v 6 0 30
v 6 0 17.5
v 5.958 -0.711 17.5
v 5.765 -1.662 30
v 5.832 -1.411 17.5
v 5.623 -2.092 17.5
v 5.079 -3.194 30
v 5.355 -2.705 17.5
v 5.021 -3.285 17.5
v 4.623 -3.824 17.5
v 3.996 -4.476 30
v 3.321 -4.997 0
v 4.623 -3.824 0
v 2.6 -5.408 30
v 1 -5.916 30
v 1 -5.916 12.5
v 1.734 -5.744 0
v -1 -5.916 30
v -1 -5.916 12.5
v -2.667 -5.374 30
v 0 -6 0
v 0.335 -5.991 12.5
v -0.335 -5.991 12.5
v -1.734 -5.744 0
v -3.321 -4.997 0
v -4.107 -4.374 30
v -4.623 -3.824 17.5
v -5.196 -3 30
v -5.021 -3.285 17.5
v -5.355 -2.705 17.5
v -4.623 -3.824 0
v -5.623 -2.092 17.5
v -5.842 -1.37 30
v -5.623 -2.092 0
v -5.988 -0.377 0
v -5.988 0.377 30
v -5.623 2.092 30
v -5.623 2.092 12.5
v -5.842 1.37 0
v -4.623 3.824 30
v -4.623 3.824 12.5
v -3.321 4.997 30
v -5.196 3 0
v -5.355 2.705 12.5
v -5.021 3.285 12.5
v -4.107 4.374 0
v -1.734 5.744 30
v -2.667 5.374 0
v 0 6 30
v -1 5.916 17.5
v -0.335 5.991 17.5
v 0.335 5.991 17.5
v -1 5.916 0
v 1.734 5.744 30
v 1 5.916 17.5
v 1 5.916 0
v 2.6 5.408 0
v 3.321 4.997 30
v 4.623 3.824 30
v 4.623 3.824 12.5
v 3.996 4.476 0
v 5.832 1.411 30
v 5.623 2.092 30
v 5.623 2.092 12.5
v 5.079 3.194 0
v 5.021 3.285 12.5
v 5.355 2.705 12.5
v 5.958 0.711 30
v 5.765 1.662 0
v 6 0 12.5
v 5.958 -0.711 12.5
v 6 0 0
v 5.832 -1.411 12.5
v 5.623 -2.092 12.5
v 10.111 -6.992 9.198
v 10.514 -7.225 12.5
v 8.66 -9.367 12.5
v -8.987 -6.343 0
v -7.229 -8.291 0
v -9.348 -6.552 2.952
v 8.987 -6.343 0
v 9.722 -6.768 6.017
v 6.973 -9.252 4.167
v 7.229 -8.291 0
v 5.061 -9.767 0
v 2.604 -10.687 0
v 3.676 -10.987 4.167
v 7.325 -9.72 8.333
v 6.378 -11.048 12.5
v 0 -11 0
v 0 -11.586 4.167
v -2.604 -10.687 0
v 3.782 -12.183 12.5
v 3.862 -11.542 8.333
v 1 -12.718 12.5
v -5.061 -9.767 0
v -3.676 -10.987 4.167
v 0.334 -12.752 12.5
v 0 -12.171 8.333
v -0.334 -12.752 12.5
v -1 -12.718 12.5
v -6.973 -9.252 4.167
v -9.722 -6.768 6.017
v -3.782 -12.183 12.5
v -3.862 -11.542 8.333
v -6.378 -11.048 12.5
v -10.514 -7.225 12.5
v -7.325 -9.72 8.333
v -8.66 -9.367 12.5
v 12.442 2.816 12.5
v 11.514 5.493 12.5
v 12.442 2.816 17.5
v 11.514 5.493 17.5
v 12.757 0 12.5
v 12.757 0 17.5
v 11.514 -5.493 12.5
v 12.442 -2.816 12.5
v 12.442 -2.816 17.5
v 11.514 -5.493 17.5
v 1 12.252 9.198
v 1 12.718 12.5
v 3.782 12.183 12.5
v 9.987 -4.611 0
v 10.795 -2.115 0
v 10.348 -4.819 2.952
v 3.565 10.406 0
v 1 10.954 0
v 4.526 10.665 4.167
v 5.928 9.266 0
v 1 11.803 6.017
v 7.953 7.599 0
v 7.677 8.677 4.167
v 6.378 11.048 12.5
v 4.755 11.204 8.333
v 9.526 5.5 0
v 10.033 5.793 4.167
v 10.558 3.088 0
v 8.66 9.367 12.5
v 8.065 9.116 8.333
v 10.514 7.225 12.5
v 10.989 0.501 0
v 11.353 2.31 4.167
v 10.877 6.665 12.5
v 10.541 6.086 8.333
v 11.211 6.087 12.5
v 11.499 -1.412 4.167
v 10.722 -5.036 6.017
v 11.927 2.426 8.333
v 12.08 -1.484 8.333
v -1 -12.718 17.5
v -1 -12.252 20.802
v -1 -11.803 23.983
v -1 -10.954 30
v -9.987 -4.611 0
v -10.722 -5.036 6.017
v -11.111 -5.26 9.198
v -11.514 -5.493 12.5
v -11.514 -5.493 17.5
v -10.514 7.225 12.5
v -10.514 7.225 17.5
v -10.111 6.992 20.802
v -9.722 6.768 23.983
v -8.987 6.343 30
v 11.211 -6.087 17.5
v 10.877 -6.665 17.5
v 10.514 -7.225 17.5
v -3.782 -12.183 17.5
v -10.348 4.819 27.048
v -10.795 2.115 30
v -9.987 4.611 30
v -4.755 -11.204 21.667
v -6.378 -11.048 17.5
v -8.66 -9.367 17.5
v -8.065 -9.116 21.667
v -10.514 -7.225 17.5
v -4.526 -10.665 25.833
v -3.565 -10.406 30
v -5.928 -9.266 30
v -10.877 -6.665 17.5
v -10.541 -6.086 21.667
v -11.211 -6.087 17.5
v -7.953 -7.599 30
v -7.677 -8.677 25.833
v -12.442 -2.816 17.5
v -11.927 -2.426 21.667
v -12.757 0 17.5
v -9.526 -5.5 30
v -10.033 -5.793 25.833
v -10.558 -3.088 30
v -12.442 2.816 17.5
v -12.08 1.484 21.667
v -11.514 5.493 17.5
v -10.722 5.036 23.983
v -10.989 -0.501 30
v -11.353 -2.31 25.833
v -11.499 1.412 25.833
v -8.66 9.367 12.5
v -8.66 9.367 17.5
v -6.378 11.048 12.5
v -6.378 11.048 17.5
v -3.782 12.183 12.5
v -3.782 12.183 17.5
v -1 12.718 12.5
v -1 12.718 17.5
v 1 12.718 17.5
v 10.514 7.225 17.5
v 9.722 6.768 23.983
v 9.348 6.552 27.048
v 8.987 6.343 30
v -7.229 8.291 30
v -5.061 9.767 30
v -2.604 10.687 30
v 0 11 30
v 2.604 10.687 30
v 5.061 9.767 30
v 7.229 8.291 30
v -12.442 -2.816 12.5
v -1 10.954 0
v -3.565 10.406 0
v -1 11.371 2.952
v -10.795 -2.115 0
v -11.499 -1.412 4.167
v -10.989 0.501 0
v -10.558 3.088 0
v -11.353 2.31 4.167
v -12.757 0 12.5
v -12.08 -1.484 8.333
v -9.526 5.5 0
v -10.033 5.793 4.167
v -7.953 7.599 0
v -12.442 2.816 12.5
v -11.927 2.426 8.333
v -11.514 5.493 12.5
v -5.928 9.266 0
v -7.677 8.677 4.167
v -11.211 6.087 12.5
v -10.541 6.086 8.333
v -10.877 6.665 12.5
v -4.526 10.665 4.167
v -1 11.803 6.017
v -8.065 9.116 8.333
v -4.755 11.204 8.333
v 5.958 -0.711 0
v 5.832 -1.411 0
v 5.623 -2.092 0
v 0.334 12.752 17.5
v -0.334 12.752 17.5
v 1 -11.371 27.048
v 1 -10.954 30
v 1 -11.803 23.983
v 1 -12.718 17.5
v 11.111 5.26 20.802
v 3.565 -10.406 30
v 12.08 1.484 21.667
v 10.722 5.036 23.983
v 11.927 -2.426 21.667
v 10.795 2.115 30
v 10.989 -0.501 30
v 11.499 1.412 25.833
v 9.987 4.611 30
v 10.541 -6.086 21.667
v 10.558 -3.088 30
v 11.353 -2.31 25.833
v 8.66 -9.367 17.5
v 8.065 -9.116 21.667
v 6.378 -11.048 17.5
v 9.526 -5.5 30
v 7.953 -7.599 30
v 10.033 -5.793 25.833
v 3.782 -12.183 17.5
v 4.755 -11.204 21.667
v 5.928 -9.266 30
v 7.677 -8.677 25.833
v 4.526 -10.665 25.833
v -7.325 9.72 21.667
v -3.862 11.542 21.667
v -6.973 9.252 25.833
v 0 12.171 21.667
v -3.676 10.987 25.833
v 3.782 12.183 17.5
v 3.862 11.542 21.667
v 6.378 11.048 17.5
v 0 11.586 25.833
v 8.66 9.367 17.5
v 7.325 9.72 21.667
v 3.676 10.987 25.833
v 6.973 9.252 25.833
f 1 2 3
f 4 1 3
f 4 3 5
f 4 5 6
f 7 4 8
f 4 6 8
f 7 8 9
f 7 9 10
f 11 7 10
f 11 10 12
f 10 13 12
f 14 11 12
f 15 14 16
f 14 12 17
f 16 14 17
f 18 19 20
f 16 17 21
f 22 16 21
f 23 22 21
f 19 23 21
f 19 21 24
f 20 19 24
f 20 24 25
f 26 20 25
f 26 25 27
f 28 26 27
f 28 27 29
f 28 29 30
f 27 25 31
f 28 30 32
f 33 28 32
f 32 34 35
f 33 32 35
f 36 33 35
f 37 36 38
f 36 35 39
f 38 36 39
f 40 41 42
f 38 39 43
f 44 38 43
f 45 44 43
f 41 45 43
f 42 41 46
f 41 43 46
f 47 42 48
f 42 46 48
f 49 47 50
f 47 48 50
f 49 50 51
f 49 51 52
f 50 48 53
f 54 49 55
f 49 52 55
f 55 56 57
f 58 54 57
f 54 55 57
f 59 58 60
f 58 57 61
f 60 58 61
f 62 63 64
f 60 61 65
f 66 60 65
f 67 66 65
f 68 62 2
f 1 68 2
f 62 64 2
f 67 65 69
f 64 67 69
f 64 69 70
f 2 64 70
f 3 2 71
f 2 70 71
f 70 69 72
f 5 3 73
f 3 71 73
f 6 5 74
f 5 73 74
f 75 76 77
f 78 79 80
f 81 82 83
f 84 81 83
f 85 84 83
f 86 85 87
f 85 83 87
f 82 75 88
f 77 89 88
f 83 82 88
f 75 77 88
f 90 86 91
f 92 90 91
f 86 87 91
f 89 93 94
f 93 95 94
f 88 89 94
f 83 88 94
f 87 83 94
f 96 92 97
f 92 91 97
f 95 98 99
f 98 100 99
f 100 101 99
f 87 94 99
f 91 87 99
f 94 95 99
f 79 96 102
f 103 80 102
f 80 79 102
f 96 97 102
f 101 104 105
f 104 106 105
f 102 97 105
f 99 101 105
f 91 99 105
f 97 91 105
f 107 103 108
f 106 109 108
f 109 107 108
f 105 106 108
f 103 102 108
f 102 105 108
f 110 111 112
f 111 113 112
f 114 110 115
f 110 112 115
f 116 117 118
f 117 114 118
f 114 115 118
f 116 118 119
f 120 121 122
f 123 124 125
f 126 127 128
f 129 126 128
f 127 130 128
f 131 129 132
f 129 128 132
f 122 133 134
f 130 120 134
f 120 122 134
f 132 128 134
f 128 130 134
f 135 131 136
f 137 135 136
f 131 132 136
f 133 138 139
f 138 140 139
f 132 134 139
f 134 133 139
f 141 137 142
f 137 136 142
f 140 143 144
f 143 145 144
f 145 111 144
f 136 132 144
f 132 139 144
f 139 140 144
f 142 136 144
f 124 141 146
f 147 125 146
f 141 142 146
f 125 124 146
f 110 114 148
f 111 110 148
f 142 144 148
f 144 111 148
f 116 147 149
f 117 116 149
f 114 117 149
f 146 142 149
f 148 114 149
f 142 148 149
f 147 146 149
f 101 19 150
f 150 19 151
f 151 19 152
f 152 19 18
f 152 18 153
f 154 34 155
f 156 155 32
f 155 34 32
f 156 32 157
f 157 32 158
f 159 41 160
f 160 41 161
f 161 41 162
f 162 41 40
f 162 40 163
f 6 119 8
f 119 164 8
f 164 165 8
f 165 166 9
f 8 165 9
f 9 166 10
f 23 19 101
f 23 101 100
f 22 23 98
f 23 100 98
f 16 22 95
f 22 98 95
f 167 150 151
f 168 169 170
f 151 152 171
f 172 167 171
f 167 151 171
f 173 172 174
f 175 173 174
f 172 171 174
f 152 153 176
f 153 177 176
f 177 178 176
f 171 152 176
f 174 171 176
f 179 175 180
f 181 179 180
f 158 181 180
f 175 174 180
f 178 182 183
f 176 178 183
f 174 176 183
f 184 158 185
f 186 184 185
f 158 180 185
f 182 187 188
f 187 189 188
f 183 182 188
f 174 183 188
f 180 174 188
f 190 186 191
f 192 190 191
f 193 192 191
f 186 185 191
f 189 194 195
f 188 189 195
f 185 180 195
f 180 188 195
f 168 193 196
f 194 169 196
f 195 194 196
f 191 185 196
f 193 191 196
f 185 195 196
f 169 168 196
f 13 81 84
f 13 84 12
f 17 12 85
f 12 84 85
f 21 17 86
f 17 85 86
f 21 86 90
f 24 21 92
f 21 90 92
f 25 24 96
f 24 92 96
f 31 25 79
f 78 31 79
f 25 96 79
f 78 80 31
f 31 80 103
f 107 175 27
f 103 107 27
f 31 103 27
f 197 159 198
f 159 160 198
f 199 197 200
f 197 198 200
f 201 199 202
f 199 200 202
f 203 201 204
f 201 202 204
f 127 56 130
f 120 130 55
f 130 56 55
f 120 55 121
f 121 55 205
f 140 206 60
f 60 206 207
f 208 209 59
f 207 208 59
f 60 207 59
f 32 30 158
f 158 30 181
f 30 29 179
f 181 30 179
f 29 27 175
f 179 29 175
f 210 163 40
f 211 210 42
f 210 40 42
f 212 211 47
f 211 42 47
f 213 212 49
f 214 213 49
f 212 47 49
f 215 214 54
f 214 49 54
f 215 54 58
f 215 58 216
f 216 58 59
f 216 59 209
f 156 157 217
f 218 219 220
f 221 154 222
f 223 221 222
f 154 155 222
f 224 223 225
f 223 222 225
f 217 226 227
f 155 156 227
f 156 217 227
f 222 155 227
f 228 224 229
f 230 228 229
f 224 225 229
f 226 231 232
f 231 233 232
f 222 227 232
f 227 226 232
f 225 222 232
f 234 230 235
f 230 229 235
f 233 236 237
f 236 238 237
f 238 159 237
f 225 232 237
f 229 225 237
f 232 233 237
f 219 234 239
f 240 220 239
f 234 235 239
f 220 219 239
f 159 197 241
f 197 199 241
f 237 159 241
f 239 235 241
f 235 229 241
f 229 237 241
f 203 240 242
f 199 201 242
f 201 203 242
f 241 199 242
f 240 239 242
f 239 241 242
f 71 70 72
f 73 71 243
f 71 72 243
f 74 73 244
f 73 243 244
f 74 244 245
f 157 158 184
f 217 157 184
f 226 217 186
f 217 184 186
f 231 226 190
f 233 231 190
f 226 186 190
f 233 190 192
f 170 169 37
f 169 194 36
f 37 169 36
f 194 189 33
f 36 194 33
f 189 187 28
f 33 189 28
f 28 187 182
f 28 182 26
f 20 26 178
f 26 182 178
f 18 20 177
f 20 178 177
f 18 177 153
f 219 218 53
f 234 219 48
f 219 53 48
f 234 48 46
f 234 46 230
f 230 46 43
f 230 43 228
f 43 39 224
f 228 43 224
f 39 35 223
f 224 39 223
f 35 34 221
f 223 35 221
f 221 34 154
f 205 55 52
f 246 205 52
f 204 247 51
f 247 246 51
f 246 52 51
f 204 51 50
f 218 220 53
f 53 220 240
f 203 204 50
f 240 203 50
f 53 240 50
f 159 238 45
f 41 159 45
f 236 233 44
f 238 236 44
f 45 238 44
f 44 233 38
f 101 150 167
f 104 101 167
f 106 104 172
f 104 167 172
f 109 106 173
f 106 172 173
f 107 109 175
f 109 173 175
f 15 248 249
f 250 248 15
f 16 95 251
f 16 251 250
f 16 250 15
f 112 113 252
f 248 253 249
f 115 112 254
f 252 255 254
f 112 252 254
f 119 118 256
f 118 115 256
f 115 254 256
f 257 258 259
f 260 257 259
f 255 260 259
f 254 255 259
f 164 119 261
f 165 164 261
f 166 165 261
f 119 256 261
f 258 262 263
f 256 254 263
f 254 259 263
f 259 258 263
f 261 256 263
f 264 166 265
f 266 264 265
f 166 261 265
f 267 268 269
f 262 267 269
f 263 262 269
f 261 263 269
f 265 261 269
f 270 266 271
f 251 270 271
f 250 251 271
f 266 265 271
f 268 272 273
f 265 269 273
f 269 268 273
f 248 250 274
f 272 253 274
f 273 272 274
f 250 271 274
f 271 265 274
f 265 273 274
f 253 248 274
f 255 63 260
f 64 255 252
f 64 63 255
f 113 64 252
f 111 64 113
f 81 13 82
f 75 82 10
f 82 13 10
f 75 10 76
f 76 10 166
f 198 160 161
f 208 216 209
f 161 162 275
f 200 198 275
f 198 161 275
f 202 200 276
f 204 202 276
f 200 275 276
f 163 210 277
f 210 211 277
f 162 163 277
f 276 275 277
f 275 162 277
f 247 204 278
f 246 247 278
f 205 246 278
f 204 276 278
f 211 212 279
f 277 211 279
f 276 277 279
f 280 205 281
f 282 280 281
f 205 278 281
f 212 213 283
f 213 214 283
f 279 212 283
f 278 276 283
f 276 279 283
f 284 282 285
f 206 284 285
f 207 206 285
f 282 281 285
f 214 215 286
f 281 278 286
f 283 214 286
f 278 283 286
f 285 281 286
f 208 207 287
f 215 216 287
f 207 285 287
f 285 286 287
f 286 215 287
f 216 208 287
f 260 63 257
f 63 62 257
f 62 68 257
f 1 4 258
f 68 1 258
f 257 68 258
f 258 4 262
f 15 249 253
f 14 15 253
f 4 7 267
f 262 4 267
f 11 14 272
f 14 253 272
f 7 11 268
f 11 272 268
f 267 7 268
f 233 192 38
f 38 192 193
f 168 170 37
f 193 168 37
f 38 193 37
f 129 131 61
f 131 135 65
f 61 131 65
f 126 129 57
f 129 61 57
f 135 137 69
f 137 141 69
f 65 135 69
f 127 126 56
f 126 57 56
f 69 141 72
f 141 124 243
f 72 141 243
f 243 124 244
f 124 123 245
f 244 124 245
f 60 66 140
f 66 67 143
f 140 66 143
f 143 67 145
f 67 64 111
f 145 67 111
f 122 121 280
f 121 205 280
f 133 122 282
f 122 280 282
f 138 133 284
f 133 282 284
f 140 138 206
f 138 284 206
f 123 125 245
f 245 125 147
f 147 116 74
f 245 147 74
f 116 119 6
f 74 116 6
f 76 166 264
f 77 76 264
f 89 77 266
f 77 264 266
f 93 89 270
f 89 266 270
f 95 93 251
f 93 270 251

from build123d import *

# Parameters (mm, degrees)
F0_W     = 6.7567604338
F0_H     = 5
F3_DEPTH = 5
F6_DEPTH = 25
F7_DEPTH = 25


# Not quite as in the source:
# - a feature names something its author has since deleted; it is built from what else it names


with BuildPart() as f1:
    # F0 (on Front) → F1 (revolve)
    with BuildSketch(Plane.XZ):
        with Locations((9.3783802169, 15)):
            Rectangle(F0_W, F0_H)
    revolve(axis=Axis((0, 0, -3.2319817692), (0, 0, -1)))

    # F2 (on face) → F3 (cut, through all)
    with BuildSketch(Plane.XY.offset(17.5)):
        with BuildLine():
            ThreePointArc((1, 12.7175051313), (0, 12.7567604338), (-1, 12.7175051313))
            Line((-1, 12.7175051313), (-1, 5.9160797831))
            ThreePointArc((-1, 5.9160797831), (0, 6), (1, 5.9160797831))
            Line((1, 5.9160797831), (1, 12.7175051313))
        make_face()
        with BuildLine():
            Line((-4.623475383, 3.8240652953), (-10.5136825165, 7.2247779694))
            ThreePointArc((-10.5136825165, 7.2247779694), (-11.0476786056, 6.3783802169), (-11.5136825165, 5.4927271619))
            Line((-11.5136825165, 5.4927271619), (-5.623475383, 2.0920144878))
            ThreePointArc((-5.623475383, 2.0920144878), (-5.1961524227, 3), (-4.623475383, 3.8240652953))
        make_face()
        with BuildLine():
            Line((-5.623475383, -2.0920144878), (-11.5136825165, -5.4927271619))
            ThreePointArc((-11.5136825165, -5.4927271619), (-11.0476786056, -6.3783802169), (-10.5136825165, -7.2247779694))
            Line((-10.5136825165, -7.2247779694), (-4.623475383, -3.8240652953))
            ThreePointArc((-4.623475383, -3.8240652953), (-5.1961524227, -3), (-5.623475383, -2.0920144878))
        make_face()
        with BuildLine():
            Line((-1, -5.9160797831), (-1, -12.7175051313))
            ThreePointArc((-1, -12.7175051313), (0, -12.7567604338), (1, -12.7175051313))
            Line((1, -12.7175051313), (1, -5.9160797831))
            ThreePointArc((1, -5.9160797831), (0, -6), (-1, -5.9160797831))
        make_face()
        with BuildLine():
            ThreePointArc((10.5136825165, -7.2247779694), (11.0476786056, -6.3783802169), (11.5136825165, -5.4927271619))
            Line((11.5136825165, -5.4927271619), (5.623475383, -2.0920144878))
            ThreePointArc((5.623475383, -2.0920144878), (5.1961524227, -3), (4.623475383, -3.8240652953))
            Line((4.623475383, -3.8240652953), (10.5136825165, -7.2247779694))
        make_face()
        with BuildLine():
            ThreePointArc((11.5136825165, 5.4927271619), (11.0476786056, 6.3783802169), (10.5136825165, 7.2247779694))
            Line((10.5136825165, 7.2247779694), (4.623475383, 3.8240652953))
            ThreePointArc((4.623475383, 3.8240652953), (5.1961524227, 3), (5.623475383, 2.0920144878))
            Line((5.623475383, 2.0920144878), (11.5136825165, 5.4927271619))
        make_face()
    extrude(amount=-F3_DEPTH, mode=Mode.SUBTRACT)


with BuildPart() as f4:
    # F0 (on Front) → F4 (revolve)
    with BuildSketch(Plane.XZ):
        Polygon((6, 30), (6, 17.5), (12.7567604338, 17.5), (11, 30), align=None)
    revolve(axis=Axis((0, 0, -3.2319817692), (0, 0, -1)))


with BuildPart() as f4b:
    # F0 (on Front) → F4, piece 2 (revolve)
    with BuildSketch(Plane.XZ):
        Polygon((6, 12.5), (6, 0), (11, 0), (12.7567604338, 12.5), align=None)
    revolve(axis=Axis((0, 0, -3.2319817692), (0, 0, -1)))


with BuildPart() as f1_1:
    add(f1.part)

    # F5: union F4b, F4
    add(f4b.part)
    add(f4.part)

    # F6 (cut): faces of the model
    f6_faces = [f1_1.faces().sort_by_distance(p)[0] for p in [
        (0, -9.3578583369, 17.5),
        (8.1041430447, 4.6789291684, 17.5),
        (-8.1041430447, 4.6789291684, 17.5),
    ]]
    extrude(f6_faces, amount=-F6_DEPTH, mode=Mode.SUBTRACT)

    # F7 (cut): faces of the model
    f7_faces = [f1_1.faces().sort_by_distance(p)[0] for p in [
        (8.1041430447, -4.6789291684, 12.5),
        (0, 9.3578583369, 12.5),
        (-8.1041430447, -4.6789291684, 12.5),
    ]]
    extrude(f7_faces, amount=-F7_DEPTH, mode=Mode.SUBTRACT)


solid = f1_1.part
